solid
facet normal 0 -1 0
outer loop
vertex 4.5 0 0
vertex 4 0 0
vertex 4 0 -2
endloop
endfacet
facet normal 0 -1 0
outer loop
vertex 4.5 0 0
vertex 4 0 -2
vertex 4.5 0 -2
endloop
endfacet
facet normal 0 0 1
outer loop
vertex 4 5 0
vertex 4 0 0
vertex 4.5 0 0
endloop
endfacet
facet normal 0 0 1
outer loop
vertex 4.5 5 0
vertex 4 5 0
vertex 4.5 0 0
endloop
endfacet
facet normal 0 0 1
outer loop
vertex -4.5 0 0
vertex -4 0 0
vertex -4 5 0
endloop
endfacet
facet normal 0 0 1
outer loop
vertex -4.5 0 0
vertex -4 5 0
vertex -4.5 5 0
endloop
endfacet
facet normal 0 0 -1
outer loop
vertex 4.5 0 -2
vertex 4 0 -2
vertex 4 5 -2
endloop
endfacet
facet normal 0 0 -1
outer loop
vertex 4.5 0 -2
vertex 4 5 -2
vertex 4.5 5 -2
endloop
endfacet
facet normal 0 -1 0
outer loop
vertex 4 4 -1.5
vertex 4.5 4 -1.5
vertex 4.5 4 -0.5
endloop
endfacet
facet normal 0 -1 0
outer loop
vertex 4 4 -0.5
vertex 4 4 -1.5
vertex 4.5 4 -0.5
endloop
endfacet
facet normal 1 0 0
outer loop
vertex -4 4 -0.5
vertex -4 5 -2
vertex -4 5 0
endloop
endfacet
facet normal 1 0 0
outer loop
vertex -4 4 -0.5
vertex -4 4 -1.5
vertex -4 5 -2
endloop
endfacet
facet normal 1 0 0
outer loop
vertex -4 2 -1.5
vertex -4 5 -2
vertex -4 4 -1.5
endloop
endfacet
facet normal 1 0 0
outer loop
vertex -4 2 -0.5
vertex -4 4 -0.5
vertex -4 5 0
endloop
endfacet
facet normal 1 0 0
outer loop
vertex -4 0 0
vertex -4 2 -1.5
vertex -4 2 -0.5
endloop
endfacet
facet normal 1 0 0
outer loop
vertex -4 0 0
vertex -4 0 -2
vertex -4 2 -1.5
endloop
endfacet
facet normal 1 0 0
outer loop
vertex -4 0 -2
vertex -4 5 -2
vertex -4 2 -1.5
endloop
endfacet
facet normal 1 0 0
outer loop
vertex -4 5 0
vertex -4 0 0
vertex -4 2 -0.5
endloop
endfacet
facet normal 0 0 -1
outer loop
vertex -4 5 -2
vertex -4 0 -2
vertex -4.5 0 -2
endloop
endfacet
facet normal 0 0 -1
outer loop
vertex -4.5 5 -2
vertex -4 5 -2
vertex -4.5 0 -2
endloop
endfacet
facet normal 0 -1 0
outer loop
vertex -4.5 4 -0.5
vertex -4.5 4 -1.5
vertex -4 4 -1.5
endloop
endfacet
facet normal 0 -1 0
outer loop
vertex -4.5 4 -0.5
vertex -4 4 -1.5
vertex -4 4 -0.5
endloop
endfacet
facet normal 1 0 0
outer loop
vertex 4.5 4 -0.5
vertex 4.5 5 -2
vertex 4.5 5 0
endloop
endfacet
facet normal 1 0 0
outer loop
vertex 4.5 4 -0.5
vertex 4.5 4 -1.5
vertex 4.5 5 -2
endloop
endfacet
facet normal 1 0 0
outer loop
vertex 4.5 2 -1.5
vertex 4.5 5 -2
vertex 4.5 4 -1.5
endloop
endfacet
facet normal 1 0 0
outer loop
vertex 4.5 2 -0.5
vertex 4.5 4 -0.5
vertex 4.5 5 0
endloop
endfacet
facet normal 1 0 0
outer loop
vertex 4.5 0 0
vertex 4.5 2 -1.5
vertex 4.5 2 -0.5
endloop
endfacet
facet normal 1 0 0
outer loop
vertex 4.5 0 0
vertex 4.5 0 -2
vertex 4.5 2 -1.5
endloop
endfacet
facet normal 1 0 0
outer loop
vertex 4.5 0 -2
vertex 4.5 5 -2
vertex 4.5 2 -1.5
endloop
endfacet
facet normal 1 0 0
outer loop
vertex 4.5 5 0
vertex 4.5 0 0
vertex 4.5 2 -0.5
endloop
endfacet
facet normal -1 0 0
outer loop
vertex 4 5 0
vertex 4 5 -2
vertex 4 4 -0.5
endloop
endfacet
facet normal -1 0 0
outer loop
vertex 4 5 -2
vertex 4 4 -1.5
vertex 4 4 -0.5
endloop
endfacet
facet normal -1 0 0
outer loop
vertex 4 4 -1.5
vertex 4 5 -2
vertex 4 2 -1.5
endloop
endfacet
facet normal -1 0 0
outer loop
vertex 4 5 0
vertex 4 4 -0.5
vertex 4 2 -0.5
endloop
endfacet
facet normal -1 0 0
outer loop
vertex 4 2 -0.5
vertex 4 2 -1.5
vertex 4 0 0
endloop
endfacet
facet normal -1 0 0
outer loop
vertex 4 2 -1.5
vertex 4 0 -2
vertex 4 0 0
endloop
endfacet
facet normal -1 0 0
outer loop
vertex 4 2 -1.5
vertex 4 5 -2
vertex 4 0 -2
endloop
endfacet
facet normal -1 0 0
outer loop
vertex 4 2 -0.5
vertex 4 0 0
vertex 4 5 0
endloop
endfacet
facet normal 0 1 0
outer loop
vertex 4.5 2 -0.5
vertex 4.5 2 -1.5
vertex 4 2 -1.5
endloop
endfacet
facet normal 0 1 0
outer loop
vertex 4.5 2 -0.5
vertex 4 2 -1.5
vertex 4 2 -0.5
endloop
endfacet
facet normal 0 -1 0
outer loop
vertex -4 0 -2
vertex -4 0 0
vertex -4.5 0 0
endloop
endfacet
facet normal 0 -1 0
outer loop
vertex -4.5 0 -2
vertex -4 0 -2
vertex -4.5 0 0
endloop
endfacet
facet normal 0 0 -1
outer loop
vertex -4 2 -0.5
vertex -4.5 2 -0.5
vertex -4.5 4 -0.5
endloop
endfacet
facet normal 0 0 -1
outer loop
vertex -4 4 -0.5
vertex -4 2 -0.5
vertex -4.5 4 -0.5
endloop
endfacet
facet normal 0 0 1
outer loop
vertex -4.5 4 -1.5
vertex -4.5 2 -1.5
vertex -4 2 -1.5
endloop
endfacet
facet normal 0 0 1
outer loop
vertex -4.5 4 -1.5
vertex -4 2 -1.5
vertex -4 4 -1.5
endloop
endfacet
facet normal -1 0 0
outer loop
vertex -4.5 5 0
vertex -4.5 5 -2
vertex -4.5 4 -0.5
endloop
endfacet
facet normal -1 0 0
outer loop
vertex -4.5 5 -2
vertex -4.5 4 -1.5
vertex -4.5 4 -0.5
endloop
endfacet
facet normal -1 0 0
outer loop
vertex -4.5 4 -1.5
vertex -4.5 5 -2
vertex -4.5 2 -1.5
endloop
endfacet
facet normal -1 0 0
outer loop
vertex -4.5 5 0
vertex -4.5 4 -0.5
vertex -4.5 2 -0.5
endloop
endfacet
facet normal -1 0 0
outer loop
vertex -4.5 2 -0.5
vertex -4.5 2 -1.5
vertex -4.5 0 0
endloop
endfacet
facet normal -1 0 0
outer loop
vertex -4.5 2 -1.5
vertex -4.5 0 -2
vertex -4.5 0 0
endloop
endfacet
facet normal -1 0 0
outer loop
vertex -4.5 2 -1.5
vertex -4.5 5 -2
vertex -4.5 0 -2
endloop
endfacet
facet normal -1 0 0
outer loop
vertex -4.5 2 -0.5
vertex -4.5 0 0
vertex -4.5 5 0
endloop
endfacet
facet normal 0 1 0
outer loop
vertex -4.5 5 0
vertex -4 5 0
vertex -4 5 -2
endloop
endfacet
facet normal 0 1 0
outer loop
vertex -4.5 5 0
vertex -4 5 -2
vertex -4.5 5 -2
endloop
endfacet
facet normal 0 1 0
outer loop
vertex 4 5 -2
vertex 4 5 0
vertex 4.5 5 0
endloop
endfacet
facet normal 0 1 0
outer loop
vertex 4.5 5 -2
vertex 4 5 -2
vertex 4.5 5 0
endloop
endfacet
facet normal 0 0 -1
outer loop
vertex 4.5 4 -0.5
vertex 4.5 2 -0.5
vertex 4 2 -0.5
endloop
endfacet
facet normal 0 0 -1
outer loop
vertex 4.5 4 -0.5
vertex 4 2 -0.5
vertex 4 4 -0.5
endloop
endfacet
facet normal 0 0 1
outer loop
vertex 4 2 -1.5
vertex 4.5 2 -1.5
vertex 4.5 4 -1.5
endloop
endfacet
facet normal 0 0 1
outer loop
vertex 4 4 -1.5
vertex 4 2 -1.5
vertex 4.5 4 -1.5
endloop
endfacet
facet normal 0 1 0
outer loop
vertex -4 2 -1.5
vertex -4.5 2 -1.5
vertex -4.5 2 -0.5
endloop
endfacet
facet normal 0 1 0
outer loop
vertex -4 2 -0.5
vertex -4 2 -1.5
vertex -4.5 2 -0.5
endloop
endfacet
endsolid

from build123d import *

# Parameters (mm, degrees)
SKETCH005_W  = 0.5
SKETCH005_H  = 2
PAD002_DEPTH = 5
SKETCH006_W  = 1
SKETCH006_H  = 2
POCKET_DEPTH = 11.317654


with BuildPart() as part:
    # Sketch005 (on Plane of DatumPlane) → Pad002 (new body)
    with BuildSketch(Plane(origin=(0, 0, 0), x_dir=(-1, 0, 0), z_dir=(0, 1, 0))):
        with Locations((4.25, -1)):
            Rectangle(SKETCH005_W, SKETCH005_H)
    pad002 = extrude(amount=PAD002_DEPTH)

    # Sketch006 (on Face2 of Pad002) → Pocket (cut, through all)
    with BuildSketch(Plane.ZY.offset(4.5)):
        with Locations((-1, 3)):
            Rectangle(SKETCH006_W, SKETCH006_H)
    pocket = extrude(amount=-POCKET_DEPTH, mode=Mode.SUBTRACT)

    # Mirrored: Pad002, Pocket across YZ
    add(pad002.mirror(Plane.YZ))
    add(pocket.mirror(Plane.YZ), mode=Mode.SUBTRACT)


solid = part.part
